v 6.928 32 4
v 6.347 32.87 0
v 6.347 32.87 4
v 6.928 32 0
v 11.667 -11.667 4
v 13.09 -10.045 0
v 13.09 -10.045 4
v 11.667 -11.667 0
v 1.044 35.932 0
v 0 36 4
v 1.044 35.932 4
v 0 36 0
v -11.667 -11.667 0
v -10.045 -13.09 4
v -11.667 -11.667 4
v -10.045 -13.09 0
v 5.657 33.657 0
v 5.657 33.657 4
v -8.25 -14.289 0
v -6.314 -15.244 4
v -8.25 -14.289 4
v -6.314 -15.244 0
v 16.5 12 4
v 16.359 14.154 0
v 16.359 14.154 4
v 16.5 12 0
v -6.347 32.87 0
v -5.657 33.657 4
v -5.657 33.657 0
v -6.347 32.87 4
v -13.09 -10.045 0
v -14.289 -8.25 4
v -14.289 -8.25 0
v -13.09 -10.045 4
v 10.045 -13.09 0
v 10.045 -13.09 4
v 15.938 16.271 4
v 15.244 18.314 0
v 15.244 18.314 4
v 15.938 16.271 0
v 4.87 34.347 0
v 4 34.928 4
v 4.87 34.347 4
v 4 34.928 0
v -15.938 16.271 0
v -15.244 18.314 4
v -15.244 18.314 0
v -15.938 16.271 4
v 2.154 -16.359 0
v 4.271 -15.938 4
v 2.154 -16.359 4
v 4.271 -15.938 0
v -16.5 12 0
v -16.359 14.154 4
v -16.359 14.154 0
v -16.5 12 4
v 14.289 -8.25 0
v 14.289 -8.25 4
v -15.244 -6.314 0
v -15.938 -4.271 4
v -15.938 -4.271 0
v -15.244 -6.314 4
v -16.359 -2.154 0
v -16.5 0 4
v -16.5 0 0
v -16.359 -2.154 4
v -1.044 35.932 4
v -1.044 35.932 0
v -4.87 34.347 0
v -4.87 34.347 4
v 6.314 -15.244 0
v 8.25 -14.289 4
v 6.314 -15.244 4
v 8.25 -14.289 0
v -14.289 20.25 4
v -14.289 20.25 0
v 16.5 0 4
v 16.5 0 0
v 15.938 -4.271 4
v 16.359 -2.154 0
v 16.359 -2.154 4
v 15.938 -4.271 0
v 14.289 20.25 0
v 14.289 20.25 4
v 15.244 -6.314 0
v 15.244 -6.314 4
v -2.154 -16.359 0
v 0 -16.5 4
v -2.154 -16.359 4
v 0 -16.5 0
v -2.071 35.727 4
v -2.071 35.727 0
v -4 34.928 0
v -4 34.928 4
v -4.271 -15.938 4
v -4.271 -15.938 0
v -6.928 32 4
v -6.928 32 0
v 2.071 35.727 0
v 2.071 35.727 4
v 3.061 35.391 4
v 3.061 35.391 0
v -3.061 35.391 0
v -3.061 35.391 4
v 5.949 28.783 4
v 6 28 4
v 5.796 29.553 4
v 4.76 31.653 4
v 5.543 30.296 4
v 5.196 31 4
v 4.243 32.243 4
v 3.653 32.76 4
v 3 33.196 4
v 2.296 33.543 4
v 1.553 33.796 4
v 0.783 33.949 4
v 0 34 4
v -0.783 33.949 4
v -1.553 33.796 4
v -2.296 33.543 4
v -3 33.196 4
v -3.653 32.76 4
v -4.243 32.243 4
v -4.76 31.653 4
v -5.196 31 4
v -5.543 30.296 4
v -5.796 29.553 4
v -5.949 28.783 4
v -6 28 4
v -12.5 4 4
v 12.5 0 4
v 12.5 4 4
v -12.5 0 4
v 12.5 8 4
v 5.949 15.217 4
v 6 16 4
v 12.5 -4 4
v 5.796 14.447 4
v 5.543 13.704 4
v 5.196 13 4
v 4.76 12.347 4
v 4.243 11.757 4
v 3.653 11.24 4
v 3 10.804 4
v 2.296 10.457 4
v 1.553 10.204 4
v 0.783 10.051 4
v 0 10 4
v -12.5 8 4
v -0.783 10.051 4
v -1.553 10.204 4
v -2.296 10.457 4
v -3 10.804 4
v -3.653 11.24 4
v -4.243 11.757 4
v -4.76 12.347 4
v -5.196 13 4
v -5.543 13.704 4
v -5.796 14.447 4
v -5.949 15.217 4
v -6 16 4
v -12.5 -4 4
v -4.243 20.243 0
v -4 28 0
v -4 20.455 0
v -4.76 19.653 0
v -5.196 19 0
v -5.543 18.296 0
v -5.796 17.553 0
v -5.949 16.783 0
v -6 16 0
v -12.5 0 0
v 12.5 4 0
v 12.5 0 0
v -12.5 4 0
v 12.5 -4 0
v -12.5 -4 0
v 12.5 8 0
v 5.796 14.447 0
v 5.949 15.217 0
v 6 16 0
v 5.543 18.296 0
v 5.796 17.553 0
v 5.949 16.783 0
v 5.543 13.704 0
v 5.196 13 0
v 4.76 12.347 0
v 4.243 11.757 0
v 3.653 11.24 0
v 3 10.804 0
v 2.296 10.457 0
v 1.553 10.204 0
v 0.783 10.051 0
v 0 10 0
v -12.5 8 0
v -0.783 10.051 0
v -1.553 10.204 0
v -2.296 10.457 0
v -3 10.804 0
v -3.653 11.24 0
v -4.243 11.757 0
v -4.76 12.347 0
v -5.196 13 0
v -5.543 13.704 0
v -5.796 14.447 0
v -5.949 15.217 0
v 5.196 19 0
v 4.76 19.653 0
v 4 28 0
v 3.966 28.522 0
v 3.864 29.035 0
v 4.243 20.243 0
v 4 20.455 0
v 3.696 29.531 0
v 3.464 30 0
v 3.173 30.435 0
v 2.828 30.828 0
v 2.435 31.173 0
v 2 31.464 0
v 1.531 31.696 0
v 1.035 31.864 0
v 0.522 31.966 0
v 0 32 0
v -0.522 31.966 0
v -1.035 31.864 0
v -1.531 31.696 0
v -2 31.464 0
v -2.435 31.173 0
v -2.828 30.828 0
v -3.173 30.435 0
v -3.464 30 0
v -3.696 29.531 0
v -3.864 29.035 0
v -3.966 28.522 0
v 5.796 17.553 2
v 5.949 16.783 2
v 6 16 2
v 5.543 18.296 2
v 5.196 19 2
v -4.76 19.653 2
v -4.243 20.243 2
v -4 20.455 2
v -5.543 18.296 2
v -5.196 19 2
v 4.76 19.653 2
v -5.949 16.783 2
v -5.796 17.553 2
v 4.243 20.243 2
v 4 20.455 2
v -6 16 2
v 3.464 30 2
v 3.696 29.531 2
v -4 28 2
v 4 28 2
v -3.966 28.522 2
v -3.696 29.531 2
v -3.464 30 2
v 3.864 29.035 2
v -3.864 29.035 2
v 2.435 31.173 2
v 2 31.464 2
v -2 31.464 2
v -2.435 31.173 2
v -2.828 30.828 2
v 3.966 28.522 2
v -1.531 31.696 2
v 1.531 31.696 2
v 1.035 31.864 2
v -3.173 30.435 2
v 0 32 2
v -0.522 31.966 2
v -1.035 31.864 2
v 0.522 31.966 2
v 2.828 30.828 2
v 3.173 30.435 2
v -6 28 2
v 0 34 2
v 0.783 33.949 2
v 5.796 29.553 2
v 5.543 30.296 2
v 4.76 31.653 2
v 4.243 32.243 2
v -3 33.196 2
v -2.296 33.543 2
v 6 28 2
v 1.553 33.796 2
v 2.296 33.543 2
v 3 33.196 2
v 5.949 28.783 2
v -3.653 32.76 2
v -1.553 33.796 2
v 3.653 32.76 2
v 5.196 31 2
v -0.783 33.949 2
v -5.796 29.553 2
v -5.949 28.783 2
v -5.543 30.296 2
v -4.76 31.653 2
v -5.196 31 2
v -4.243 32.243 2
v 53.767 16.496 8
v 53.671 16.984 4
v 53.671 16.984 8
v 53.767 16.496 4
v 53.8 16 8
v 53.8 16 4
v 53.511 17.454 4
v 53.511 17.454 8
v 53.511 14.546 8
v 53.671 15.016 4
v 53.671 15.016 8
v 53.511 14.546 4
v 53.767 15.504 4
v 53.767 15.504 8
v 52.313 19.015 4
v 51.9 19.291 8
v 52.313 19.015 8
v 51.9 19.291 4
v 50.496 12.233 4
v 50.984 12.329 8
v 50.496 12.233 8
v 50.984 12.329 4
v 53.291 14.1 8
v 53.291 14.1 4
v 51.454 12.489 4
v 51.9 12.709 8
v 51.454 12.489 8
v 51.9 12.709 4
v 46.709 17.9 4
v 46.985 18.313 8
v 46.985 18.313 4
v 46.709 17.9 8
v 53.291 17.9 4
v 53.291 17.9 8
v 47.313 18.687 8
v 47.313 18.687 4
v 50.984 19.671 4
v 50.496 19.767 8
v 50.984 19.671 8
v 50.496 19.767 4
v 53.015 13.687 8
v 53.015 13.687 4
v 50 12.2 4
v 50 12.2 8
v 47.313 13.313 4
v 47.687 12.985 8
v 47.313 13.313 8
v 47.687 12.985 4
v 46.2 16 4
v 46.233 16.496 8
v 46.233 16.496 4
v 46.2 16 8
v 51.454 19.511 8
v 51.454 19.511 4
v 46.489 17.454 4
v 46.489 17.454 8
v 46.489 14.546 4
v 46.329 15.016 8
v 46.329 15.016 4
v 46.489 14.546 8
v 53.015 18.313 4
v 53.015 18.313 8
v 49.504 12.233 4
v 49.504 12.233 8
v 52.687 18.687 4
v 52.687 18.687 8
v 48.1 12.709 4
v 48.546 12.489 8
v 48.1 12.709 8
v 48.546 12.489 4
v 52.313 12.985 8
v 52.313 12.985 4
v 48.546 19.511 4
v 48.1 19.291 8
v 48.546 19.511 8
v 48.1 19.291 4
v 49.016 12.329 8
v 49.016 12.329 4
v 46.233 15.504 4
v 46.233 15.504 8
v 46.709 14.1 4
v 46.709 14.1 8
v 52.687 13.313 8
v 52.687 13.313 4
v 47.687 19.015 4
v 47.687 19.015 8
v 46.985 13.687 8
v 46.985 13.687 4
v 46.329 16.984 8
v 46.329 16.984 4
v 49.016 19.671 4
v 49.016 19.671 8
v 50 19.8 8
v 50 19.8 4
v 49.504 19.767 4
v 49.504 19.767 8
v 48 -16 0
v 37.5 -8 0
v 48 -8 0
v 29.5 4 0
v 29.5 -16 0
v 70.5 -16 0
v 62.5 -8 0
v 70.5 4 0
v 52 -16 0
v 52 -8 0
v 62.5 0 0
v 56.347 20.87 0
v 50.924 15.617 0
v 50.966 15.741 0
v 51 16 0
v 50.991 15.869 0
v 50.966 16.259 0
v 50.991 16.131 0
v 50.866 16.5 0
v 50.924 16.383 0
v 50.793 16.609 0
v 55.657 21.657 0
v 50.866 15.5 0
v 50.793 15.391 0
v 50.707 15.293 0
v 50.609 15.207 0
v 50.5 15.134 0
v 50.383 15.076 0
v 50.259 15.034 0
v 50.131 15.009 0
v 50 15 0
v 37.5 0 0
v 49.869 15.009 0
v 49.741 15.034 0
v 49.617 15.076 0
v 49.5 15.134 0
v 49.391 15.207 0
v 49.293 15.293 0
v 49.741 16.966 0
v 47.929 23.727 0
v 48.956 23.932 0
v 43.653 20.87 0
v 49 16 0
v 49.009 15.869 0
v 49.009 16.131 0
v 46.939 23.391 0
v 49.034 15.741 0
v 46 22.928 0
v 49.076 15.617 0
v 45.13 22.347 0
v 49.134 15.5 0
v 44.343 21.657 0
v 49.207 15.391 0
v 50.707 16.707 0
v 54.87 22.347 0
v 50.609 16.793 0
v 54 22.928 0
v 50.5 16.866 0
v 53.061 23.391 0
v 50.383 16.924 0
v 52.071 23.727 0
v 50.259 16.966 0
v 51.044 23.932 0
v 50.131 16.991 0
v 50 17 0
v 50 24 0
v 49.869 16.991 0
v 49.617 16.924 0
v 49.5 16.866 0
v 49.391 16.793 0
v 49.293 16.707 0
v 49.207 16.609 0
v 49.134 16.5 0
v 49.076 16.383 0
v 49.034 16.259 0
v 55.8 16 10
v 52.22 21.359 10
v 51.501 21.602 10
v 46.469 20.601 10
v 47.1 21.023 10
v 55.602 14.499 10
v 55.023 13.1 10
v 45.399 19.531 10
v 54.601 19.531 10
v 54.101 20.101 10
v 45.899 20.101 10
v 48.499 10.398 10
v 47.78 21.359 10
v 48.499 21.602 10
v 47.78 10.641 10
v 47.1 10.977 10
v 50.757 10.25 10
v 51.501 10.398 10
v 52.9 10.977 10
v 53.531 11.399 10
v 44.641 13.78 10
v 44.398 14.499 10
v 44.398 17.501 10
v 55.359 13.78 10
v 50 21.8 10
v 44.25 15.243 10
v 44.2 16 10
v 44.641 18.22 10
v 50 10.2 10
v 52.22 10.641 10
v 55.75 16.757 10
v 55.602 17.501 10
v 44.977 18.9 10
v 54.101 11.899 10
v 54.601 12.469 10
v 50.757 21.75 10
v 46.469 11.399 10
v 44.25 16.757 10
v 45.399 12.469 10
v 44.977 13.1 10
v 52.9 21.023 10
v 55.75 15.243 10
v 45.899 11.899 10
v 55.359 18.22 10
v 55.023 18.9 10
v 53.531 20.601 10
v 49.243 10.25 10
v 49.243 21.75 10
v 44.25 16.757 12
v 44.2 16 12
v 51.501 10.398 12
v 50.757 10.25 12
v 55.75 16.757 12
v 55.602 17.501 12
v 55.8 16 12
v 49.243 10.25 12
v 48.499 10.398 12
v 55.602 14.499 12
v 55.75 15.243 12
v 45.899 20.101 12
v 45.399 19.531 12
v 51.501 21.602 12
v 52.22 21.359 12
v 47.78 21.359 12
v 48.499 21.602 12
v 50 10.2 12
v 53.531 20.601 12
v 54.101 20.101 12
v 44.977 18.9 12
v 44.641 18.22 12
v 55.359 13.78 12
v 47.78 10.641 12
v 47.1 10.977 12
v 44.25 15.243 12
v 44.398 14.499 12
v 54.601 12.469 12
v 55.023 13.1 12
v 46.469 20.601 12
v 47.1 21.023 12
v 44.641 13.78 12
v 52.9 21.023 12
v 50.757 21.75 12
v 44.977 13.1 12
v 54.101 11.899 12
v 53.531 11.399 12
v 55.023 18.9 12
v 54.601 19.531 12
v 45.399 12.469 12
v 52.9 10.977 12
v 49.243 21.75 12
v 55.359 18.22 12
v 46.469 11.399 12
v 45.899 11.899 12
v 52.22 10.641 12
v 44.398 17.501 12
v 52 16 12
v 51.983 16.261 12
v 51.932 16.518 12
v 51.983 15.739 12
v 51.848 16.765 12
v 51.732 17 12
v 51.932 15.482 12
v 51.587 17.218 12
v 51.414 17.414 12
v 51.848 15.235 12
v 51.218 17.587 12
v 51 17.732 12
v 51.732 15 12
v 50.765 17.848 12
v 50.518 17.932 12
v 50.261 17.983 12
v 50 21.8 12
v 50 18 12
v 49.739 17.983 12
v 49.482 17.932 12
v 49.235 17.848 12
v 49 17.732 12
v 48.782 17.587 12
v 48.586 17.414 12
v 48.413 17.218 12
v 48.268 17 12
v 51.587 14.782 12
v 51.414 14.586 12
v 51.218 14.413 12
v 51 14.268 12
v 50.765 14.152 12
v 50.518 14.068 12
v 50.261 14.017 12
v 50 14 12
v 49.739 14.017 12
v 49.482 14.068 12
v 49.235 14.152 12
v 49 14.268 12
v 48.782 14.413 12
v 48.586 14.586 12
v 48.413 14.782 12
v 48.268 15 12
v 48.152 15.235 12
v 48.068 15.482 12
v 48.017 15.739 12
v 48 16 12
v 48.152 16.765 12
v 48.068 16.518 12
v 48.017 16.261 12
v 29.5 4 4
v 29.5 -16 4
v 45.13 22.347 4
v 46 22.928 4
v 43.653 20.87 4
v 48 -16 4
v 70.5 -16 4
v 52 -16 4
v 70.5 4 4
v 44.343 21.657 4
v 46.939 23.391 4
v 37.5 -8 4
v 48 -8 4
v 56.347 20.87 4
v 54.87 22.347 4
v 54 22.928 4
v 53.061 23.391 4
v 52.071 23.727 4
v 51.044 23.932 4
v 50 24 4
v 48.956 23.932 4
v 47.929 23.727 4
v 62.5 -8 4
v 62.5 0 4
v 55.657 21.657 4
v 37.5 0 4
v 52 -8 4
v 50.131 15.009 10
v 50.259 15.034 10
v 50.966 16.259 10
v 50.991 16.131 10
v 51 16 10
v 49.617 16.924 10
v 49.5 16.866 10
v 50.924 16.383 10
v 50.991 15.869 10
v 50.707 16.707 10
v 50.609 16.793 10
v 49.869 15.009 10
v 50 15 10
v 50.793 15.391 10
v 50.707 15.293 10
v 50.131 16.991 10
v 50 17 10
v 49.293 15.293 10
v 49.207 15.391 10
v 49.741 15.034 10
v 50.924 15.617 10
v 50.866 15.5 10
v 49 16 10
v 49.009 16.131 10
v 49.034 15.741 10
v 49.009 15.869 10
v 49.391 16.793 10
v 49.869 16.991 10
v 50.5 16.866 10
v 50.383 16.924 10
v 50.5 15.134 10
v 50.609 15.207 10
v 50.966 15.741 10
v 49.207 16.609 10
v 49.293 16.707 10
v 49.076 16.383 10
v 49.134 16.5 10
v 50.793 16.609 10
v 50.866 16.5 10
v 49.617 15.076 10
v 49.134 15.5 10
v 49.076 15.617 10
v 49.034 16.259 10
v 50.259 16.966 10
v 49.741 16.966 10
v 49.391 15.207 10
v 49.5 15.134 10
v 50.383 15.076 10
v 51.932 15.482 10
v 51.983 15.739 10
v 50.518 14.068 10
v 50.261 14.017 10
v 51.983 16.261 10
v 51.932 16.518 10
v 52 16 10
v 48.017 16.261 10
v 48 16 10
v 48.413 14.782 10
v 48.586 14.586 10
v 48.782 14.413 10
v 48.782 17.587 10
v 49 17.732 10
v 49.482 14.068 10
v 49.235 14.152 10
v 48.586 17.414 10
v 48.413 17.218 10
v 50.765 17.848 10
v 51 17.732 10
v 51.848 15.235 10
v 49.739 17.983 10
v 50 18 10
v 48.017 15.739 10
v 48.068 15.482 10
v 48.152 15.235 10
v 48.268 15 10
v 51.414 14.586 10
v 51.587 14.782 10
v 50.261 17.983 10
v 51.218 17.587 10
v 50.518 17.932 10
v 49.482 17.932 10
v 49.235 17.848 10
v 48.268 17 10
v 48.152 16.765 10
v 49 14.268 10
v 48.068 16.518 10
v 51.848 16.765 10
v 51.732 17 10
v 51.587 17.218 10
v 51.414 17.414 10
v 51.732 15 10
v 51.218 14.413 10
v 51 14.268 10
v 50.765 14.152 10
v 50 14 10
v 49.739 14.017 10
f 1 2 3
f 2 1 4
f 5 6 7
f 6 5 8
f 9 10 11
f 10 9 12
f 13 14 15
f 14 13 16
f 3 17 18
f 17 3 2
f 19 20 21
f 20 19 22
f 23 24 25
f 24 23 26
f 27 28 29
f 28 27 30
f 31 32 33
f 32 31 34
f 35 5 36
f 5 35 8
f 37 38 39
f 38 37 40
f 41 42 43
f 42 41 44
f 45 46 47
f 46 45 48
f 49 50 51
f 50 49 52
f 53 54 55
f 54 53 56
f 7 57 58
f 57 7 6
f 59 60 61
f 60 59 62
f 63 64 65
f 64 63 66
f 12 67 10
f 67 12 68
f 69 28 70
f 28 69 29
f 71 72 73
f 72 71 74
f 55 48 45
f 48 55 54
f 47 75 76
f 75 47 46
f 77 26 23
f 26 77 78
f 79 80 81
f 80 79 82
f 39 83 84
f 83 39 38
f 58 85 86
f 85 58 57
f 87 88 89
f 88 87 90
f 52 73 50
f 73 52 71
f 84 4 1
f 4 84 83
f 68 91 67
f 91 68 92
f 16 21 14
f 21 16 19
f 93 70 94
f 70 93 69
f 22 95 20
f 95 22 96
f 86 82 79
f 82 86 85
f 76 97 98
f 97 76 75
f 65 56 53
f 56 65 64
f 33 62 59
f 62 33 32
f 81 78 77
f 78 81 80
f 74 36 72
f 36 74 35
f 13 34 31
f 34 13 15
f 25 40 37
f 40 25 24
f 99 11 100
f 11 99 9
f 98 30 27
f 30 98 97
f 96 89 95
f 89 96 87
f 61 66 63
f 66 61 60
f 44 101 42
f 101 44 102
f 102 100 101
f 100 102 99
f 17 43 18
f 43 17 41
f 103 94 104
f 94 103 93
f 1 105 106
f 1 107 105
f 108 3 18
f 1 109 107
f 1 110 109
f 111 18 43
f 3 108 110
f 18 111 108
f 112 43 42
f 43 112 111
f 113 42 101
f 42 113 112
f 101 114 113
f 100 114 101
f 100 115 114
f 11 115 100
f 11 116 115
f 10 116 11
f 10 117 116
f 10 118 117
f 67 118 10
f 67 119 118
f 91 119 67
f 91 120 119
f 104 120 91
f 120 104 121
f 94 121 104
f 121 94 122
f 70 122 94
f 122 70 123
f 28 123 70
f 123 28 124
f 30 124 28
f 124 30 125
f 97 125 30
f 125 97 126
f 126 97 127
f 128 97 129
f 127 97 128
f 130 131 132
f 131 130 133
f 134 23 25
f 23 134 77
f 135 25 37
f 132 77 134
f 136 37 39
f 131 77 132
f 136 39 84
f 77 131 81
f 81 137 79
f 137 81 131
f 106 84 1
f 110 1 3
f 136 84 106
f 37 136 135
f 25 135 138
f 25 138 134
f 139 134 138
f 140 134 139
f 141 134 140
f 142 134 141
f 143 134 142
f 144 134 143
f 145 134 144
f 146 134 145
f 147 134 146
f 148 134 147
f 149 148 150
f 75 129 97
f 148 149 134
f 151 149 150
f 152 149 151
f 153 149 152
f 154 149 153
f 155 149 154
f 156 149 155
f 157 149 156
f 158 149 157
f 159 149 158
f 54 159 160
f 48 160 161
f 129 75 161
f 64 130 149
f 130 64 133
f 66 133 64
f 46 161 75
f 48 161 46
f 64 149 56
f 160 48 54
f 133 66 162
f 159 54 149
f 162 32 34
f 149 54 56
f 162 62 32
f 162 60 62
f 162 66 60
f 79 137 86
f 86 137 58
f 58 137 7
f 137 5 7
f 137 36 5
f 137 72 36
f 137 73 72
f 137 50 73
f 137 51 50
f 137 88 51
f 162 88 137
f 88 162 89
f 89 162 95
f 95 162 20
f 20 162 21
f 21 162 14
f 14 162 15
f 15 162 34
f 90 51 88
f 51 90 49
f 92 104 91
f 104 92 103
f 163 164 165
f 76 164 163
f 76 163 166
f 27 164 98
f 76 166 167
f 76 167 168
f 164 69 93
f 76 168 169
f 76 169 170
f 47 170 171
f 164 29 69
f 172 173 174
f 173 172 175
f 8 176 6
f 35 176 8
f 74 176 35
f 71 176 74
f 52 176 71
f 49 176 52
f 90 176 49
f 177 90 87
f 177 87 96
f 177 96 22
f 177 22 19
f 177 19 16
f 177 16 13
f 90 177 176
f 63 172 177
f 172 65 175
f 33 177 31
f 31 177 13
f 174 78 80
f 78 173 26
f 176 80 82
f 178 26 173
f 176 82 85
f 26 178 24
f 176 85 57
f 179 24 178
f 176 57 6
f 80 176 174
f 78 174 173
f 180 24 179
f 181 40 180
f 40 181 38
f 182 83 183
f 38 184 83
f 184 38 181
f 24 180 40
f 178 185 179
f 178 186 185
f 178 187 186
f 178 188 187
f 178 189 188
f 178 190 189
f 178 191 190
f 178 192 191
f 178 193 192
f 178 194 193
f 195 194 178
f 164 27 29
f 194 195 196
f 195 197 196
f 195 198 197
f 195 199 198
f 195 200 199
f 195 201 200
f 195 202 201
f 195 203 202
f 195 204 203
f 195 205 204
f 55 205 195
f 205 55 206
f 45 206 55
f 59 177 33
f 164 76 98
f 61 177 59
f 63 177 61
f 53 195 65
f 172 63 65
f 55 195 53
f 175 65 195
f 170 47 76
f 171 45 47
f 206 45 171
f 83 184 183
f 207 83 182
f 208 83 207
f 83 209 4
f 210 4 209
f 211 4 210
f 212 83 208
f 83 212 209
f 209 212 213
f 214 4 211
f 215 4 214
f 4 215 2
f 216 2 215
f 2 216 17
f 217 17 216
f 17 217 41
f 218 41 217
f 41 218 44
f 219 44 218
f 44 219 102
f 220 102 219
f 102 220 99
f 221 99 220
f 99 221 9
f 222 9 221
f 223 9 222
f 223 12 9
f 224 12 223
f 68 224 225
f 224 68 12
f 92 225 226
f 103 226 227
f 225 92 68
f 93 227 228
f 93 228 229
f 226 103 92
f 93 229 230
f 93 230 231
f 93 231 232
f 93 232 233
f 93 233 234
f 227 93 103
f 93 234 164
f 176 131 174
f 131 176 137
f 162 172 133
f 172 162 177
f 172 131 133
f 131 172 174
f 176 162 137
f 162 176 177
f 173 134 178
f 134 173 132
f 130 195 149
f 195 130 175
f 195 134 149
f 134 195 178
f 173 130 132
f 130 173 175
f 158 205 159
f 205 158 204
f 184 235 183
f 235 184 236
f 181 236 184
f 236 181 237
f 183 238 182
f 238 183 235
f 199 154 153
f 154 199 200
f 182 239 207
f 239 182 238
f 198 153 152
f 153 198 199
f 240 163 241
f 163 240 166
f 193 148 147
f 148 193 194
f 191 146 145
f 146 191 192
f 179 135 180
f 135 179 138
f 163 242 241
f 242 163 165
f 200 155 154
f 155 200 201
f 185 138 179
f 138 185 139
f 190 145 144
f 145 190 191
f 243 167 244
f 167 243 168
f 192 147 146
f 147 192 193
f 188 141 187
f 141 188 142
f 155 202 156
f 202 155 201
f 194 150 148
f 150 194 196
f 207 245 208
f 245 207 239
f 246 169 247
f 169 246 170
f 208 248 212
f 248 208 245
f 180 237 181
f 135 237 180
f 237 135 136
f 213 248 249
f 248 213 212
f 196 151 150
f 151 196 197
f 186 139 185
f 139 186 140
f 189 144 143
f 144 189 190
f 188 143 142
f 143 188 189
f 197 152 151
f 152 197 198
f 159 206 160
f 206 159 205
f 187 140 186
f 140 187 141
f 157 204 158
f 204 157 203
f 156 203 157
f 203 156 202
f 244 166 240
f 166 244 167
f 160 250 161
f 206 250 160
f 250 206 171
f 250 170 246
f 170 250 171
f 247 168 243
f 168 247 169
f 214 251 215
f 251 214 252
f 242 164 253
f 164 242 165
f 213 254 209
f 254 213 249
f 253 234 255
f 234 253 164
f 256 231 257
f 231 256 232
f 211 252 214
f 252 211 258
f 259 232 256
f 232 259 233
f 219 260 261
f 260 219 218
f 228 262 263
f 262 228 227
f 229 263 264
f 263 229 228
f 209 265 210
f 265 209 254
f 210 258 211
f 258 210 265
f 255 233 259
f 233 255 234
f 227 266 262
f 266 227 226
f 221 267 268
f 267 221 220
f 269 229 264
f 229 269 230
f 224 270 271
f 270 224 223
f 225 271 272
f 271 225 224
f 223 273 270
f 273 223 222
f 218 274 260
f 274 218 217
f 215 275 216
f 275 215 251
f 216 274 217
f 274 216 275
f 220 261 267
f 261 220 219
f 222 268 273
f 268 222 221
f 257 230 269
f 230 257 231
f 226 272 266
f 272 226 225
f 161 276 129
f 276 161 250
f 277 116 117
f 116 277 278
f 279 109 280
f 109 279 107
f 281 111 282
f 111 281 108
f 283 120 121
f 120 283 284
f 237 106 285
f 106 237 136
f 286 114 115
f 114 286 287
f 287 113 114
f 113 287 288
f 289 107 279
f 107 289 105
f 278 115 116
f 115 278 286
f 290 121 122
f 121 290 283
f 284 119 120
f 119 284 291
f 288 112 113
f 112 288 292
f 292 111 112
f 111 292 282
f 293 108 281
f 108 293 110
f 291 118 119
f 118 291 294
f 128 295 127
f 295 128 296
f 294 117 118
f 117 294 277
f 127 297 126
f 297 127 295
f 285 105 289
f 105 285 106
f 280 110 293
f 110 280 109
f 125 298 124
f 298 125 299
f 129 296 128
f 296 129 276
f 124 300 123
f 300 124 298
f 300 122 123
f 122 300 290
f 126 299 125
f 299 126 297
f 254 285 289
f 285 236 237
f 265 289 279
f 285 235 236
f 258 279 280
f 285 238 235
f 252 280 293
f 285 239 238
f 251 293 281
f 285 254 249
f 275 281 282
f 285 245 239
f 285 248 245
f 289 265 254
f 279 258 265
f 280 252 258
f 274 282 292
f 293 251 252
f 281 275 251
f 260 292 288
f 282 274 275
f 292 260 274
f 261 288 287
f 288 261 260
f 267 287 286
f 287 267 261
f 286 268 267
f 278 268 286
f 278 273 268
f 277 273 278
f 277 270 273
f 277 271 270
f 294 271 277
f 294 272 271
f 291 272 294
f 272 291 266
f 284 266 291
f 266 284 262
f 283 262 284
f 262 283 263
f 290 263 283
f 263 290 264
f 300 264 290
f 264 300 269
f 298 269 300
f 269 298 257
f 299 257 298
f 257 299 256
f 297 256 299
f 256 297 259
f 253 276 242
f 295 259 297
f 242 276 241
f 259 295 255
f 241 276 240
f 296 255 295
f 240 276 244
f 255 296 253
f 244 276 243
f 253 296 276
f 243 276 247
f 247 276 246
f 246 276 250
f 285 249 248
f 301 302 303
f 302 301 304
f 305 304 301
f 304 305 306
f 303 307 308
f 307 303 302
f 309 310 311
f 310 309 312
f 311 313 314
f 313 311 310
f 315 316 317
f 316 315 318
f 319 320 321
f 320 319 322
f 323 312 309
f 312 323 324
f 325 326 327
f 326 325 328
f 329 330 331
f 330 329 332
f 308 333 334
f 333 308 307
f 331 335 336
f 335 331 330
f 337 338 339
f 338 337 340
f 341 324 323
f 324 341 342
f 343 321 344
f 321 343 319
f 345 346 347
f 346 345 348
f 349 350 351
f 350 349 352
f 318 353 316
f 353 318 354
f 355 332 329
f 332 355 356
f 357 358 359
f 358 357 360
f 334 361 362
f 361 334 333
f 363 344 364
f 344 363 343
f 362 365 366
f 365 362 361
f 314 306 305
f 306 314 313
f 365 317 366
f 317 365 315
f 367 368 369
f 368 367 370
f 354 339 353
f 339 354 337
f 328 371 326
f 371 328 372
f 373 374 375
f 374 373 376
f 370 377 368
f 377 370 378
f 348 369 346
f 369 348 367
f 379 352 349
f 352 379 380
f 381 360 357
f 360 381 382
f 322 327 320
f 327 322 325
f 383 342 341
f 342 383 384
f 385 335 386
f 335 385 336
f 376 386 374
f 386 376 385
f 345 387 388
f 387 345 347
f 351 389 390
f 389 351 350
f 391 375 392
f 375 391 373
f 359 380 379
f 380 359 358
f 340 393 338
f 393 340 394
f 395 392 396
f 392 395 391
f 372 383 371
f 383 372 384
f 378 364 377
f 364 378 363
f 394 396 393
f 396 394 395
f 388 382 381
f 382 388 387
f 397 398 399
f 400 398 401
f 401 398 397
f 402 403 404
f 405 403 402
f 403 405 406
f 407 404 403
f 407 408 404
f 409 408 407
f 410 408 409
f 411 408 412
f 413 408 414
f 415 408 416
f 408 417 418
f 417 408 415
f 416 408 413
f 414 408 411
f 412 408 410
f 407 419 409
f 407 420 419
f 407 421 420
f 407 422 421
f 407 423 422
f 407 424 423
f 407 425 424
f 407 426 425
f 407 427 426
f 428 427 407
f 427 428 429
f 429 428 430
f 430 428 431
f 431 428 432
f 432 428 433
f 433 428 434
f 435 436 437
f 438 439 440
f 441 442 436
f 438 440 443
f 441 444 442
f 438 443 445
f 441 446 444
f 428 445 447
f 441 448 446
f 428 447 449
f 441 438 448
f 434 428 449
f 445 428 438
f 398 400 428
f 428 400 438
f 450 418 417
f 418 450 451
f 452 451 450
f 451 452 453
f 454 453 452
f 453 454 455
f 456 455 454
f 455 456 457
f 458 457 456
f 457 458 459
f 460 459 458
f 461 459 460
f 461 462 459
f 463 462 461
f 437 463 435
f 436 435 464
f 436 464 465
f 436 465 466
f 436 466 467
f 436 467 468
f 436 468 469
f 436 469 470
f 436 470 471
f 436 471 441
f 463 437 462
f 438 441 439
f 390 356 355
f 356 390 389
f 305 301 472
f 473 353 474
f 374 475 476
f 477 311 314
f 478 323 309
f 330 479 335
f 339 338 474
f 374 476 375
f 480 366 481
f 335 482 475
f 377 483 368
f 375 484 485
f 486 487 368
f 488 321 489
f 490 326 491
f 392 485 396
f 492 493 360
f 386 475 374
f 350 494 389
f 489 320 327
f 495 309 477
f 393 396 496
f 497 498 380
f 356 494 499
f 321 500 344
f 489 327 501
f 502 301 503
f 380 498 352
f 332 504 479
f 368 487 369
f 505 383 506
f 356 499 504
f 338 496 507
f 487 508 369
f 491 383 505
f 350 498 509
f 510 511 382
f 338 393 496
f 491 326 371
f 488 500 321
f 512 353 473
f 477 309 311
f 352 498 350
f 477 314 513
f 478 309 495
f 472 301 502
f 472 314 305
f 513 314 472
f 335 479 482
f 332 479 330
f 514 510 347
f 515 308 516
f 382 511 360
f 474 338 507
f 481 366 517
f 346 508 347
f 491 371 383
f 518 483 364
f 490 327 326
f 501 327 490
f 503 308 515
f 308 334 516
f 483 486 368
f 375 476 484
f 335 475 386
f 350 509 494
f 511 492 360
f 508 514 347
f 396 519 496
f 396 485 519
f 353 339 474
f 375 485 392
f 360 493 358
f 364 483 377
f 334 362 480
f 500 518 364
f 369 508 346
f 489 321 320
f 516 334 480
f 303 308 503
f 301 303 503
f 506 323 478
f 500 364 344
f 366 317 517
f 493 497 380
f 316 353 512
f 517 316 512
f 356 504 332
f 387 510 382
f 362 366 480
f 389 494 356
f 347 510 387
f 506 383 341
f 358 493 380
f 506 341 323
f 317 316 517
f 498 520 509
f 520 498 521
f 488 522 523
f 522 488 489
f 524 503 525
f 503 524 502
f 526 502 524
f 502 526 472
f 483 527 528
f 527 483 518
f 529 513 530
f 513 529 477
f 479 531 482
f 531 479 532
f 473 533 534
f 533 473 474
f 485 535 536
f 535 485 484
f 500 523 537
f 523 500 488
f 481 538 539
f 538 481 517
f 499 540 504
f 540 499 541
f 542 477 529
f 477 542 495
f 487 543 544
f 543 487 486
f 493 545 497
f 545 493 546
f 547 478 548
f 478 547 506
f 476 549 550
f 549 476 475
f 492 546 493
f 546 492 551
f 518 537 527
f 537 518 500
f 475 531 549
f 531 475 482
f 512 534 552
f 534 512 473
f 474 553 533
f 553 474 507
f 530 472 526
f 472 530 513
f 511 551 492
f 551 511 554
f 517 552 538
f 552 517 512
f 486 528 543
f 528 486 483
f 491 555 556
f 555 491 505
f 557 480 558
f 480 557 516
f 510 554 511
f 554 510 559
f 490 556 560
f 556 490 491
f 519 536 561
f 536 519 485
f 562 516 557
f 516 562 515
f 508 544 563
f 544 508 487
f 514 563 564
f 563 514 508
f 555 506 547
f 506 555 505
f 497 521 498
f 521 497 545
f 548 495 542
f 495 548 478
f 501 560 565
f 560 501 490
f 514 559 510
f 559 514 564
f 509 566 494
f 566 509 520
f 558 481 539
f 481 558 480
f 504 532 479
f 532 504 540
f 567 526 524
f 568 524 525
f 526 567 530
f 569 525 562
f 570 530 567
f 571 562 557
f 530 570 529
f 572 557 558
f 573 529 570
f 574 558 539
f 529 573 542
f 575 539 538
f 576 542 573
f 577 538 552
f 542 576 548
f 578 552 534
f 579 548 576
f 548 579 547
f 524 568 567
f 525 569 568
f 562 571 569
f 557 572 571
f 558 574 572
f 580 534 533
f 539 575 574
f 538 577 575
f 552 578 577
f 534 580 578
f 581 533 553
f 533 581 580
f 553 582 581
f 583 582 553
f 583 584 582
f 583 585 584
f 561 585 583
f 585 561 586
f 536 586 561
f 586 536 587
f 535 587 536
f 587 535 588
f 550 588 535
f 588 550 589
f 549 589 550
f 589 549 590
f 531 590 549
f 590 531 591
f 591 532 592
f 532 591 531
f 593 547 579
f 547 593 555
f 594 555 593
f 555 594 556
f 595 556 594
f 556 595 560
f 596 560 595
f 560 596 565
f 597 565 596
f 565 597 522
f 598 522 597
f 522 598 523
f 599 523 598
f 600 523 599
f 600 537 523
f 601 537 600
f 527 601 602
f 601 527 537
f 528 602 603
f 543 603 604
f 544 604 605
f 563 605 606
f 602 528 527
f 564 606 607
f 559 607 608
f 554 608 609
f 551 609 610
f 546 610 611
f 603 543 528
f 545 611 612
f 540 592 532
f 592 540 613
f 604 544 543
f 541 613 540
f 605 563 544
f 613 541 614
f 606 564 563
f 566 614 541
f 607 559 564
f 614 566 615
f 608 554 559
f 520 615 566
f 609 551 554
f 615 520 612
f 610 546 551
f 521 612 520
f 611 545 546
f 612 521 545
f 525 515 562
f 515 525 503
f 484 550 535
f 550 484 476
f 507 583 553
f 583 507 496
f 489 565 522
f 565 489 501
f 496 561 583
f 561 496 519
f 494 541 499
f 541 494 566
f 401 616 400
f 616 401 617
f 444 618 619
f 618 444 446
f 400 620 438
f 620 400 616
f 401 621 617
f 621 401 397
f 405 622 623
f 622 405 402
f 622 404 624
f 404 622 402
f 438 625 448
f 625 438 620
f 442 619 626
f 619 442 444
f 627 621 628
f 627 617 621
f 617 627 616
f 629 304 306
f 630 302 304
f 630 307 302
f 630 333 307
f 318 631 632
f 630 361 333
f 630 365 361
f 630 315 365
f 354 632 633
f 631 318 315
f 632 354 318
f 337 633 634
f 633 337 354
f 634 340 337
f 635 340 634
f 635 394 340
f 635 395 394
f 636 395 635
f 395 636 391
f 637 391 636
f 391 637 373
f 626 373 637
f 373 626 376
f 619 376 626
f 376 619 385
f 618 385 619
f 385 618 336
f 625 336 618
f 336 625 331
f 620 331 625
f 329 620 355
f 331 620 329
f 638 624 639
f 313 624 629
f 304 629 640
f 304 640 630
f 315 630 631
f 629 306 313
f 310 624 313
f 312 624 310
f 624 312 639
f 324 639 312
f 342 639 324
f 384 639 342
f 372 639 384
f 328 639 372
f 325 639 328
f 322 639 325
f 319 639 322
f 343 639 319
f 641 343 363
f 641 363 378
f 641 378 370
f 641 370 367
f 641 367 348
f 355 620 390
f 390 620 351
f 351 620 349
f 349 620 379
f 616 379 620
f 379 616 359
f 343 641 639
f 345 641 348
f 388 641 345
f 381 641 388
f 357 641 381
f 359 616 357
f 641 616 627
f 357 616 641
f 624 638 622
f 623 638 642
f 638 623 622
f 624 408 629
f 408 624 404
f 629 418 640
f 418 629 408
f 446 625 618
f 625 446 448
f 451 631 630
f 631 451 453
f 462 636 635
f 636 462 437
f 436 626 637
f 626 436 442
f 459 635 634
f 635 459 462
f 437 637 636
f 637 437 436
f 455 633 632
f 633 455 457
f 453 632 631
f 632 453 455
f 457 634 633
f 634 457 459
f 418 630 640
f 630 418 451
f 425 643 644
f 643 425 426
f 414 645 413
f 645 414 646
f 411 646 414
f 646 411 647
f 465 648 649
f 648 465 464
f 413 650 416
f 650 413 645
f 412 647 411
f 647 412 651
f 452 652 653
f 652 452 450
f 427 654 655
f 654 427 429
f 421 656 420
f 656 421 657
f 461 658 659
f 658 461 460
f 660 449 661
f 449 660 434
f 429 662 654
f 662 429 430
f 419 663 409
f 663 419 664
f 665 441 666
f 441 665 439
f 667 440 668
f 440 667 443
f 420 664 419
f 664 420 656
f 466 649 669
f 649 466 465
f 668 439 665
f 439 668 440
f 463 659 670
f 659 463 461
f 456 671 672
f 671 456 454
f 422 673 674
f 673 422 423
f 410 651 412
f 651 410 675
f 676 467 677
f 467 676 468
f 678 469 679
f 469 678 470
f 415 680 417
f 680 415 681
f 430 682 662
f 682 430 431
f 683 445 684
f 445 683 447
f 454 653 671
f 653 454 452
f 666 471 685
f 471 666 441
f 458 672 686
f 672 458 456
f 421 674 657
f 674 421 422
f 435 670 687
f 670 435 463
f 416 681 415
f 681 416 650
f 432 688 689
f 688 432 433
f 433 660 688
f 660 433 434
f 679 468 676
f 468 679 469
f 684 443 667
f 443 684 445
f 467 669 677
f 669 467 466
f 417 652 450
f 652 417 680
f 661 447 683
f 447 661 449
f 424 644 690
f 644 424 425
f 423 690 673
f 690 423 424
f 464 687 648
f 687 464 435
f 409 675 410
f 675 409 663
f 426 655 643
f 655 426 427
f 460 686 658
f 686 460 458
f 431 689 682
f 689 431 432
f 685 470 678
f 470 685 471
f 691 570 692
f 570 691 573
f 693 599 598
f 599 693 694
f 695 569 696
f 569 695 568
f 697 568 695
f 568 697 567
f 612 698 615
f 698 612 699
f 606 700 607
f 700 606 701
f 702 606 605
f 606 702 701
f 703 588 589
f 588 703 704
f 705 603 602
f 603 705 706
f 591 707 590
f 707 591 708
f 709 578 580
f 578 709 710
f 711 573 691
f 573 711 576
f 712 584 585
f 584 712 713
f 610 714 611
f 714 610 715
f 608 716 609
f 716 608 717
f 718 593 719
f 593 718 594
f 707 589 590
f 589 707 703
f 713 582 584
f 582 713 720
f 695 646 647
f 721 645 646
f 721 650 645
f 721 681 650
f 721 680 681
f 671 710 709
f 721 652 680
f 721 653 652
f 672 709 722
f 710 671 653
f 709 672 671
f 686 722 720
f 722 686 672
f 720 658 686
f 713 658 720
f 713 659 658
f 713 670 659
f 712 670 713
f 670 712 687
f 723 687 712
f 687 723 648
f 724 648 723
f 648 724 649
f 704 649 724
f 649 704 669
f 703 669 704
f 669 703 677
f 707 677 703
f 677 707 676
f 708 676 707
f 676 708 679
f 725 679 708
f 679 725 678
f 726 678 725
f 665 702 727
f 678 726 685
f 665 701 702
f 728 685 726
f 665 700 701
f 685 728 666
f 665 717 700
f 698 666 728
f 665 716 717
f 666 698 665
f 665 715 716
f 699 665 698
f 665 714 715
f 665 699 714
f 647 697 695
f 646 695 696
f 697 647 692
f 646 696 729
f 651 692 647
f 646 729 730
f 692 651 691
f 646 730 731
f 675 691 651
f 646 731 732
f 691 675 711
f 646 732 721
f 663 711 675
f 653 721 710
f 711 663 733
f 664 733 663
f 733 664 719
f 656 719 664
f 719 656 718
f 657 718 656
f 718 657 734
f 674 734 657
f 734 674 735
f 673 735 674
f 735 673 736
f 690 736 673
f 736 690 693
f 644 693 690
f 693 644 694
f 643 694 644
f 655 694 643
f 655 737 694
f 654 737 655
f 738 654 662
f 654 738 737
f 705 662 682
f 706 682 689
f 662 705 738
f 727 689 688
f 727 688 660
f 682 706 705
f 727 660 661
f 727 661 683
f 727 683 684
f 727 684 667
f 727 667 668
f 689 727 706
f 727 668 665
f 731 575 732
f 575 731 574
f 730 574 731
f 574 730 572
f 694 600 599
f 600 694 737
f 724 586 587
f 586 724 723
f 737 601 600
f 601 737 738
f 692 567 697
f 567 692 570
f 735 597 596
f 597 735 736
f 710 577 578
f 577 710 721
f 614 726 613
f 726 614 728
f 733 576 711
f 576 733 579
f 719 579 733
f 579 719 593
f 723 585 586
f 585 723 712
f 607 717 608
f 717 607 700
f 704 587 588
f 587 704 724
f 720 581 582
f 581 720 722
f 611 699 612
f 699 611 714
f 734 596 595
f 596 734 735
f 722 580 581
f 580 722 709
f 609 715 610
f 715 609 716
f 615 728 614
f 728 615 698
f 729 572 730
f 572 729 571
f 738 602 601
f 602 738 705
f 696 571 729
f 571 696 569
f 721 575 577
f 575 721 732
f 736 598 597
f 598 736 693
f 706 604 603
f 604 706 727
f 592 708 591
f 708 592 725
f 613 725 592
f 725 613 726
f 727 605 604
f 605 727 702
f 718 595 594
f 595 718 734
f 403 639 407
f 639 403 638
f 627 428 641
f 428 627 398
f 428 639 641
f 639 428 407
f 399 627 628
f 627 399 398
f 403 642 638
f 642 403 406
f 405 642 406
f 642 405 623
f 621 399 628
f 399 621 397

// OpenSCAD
thickness = 4; //mm
strap_width = 25; //mm
length = thickness * 5;
tolerance=0.2; //mm
screw_diameter = 2; //mm
$fn=48;

loop=true;
hook=true;

if (loop) {
  difference() {
    hull() {
      cylinder(d=strap_width + 2 * thickness, h=thickness);
      translate([0, 3 * thickness, 0]) {
        cylinder(d=strap_width + 2 * thickness, h=thickness);
      }
      translate([0, 7 * thickness, 0]) {
        cylinder(d=4 * thickness, h=thickness);
      }
    }

    translate([strap_width / -2, -1 * thickness, -0.1]) {
      cube([strap_width, thickness, thickness + 0.2]);
    }
    translate([strap_width / -2, thickness, -0.1]) {
      cube([strap_width, thickness, thickness + 0.2]);
    }

    translate([0, 4 * thickness, -0.1]) {
      cylinder(d=3 * thickness, h=thickness + 0.2);
    }

    hull() {
      translate([0, 4 * thickness, -0.1]) {
        cylinder(d=2 * thickness, h=thickness + 0.2);
      }
      translate([0, 7 * thickness, -0.1]) {
        cylinder(d=2 * thickness, h=thickness + 0.2);
      }
    }

    hull() {
      translate([0, 4 * thickness, thickness / 2]) {
        cylinder(d=3 * thickness, h=thickness + 0.2);
      }
      translate([0, 7 * thickness, thickness / 2]) {
        cylinder(d=3 * thickness, h=thickness + 0.3);
      }
    }
  }
}

if (hook) {
  translate([strap_width * 2, 0, 0]) {
    difference() {
      union() {
        hull() {
          translate([strap_width / -2 - 2 * thickness, -4 * thickness, 0]) {
            cube([strap_width + 4 * thickness, thickness * 5, thickness]);
          }
          translate([0, 4 * thickness, 0]) {
            cylinder(d=4 * thickness, h=thickness);
          }
        }

        //peg/hook
        union() {
          translate([0, 4 * thickness, 0]) {
            cylinder(d=2 * thickness - 2 * tolerance, h=2 * thickness);
          }
          translate([0, 4 * thickness, 2 * thickness]) {
            cylinder(
              d1=2 * thickness - 2 * tolerance,
              d2=3 * thickness - 2 * tolerance,
              h=thickness / 2);
          }
          translate([0, 4 * thickness, 2.5 * thickness]) {
            cylinder(d=3 * thickness - 2 * tolerance, h=thickness/2);
          }
        }
      }

      // screw hole
      translate([0, 4 * thickness, -0.1]) {
        cylinder(d=screw_diameter, h=3 * thickness + 0.2);
      }
      translate([0, 4 * thickness, 3 * thickness - screw_diameter]) {
        cylinder(d=screw_diameter * 2, h=thickness + 0.1);
      }

      // slot
      translate([strap_width / -2, -2 * thickness, -0.1]) {
        cube([strap_width, 2 * thickness, thickness + 0.2]);
      }

      translate([thickness / -2, -4 * thickness - 0.1, -0.1]) {
        cube([thickness, 2 * thickness + 0.2, thickness + 0.2]);
      }
    }
  }
}
